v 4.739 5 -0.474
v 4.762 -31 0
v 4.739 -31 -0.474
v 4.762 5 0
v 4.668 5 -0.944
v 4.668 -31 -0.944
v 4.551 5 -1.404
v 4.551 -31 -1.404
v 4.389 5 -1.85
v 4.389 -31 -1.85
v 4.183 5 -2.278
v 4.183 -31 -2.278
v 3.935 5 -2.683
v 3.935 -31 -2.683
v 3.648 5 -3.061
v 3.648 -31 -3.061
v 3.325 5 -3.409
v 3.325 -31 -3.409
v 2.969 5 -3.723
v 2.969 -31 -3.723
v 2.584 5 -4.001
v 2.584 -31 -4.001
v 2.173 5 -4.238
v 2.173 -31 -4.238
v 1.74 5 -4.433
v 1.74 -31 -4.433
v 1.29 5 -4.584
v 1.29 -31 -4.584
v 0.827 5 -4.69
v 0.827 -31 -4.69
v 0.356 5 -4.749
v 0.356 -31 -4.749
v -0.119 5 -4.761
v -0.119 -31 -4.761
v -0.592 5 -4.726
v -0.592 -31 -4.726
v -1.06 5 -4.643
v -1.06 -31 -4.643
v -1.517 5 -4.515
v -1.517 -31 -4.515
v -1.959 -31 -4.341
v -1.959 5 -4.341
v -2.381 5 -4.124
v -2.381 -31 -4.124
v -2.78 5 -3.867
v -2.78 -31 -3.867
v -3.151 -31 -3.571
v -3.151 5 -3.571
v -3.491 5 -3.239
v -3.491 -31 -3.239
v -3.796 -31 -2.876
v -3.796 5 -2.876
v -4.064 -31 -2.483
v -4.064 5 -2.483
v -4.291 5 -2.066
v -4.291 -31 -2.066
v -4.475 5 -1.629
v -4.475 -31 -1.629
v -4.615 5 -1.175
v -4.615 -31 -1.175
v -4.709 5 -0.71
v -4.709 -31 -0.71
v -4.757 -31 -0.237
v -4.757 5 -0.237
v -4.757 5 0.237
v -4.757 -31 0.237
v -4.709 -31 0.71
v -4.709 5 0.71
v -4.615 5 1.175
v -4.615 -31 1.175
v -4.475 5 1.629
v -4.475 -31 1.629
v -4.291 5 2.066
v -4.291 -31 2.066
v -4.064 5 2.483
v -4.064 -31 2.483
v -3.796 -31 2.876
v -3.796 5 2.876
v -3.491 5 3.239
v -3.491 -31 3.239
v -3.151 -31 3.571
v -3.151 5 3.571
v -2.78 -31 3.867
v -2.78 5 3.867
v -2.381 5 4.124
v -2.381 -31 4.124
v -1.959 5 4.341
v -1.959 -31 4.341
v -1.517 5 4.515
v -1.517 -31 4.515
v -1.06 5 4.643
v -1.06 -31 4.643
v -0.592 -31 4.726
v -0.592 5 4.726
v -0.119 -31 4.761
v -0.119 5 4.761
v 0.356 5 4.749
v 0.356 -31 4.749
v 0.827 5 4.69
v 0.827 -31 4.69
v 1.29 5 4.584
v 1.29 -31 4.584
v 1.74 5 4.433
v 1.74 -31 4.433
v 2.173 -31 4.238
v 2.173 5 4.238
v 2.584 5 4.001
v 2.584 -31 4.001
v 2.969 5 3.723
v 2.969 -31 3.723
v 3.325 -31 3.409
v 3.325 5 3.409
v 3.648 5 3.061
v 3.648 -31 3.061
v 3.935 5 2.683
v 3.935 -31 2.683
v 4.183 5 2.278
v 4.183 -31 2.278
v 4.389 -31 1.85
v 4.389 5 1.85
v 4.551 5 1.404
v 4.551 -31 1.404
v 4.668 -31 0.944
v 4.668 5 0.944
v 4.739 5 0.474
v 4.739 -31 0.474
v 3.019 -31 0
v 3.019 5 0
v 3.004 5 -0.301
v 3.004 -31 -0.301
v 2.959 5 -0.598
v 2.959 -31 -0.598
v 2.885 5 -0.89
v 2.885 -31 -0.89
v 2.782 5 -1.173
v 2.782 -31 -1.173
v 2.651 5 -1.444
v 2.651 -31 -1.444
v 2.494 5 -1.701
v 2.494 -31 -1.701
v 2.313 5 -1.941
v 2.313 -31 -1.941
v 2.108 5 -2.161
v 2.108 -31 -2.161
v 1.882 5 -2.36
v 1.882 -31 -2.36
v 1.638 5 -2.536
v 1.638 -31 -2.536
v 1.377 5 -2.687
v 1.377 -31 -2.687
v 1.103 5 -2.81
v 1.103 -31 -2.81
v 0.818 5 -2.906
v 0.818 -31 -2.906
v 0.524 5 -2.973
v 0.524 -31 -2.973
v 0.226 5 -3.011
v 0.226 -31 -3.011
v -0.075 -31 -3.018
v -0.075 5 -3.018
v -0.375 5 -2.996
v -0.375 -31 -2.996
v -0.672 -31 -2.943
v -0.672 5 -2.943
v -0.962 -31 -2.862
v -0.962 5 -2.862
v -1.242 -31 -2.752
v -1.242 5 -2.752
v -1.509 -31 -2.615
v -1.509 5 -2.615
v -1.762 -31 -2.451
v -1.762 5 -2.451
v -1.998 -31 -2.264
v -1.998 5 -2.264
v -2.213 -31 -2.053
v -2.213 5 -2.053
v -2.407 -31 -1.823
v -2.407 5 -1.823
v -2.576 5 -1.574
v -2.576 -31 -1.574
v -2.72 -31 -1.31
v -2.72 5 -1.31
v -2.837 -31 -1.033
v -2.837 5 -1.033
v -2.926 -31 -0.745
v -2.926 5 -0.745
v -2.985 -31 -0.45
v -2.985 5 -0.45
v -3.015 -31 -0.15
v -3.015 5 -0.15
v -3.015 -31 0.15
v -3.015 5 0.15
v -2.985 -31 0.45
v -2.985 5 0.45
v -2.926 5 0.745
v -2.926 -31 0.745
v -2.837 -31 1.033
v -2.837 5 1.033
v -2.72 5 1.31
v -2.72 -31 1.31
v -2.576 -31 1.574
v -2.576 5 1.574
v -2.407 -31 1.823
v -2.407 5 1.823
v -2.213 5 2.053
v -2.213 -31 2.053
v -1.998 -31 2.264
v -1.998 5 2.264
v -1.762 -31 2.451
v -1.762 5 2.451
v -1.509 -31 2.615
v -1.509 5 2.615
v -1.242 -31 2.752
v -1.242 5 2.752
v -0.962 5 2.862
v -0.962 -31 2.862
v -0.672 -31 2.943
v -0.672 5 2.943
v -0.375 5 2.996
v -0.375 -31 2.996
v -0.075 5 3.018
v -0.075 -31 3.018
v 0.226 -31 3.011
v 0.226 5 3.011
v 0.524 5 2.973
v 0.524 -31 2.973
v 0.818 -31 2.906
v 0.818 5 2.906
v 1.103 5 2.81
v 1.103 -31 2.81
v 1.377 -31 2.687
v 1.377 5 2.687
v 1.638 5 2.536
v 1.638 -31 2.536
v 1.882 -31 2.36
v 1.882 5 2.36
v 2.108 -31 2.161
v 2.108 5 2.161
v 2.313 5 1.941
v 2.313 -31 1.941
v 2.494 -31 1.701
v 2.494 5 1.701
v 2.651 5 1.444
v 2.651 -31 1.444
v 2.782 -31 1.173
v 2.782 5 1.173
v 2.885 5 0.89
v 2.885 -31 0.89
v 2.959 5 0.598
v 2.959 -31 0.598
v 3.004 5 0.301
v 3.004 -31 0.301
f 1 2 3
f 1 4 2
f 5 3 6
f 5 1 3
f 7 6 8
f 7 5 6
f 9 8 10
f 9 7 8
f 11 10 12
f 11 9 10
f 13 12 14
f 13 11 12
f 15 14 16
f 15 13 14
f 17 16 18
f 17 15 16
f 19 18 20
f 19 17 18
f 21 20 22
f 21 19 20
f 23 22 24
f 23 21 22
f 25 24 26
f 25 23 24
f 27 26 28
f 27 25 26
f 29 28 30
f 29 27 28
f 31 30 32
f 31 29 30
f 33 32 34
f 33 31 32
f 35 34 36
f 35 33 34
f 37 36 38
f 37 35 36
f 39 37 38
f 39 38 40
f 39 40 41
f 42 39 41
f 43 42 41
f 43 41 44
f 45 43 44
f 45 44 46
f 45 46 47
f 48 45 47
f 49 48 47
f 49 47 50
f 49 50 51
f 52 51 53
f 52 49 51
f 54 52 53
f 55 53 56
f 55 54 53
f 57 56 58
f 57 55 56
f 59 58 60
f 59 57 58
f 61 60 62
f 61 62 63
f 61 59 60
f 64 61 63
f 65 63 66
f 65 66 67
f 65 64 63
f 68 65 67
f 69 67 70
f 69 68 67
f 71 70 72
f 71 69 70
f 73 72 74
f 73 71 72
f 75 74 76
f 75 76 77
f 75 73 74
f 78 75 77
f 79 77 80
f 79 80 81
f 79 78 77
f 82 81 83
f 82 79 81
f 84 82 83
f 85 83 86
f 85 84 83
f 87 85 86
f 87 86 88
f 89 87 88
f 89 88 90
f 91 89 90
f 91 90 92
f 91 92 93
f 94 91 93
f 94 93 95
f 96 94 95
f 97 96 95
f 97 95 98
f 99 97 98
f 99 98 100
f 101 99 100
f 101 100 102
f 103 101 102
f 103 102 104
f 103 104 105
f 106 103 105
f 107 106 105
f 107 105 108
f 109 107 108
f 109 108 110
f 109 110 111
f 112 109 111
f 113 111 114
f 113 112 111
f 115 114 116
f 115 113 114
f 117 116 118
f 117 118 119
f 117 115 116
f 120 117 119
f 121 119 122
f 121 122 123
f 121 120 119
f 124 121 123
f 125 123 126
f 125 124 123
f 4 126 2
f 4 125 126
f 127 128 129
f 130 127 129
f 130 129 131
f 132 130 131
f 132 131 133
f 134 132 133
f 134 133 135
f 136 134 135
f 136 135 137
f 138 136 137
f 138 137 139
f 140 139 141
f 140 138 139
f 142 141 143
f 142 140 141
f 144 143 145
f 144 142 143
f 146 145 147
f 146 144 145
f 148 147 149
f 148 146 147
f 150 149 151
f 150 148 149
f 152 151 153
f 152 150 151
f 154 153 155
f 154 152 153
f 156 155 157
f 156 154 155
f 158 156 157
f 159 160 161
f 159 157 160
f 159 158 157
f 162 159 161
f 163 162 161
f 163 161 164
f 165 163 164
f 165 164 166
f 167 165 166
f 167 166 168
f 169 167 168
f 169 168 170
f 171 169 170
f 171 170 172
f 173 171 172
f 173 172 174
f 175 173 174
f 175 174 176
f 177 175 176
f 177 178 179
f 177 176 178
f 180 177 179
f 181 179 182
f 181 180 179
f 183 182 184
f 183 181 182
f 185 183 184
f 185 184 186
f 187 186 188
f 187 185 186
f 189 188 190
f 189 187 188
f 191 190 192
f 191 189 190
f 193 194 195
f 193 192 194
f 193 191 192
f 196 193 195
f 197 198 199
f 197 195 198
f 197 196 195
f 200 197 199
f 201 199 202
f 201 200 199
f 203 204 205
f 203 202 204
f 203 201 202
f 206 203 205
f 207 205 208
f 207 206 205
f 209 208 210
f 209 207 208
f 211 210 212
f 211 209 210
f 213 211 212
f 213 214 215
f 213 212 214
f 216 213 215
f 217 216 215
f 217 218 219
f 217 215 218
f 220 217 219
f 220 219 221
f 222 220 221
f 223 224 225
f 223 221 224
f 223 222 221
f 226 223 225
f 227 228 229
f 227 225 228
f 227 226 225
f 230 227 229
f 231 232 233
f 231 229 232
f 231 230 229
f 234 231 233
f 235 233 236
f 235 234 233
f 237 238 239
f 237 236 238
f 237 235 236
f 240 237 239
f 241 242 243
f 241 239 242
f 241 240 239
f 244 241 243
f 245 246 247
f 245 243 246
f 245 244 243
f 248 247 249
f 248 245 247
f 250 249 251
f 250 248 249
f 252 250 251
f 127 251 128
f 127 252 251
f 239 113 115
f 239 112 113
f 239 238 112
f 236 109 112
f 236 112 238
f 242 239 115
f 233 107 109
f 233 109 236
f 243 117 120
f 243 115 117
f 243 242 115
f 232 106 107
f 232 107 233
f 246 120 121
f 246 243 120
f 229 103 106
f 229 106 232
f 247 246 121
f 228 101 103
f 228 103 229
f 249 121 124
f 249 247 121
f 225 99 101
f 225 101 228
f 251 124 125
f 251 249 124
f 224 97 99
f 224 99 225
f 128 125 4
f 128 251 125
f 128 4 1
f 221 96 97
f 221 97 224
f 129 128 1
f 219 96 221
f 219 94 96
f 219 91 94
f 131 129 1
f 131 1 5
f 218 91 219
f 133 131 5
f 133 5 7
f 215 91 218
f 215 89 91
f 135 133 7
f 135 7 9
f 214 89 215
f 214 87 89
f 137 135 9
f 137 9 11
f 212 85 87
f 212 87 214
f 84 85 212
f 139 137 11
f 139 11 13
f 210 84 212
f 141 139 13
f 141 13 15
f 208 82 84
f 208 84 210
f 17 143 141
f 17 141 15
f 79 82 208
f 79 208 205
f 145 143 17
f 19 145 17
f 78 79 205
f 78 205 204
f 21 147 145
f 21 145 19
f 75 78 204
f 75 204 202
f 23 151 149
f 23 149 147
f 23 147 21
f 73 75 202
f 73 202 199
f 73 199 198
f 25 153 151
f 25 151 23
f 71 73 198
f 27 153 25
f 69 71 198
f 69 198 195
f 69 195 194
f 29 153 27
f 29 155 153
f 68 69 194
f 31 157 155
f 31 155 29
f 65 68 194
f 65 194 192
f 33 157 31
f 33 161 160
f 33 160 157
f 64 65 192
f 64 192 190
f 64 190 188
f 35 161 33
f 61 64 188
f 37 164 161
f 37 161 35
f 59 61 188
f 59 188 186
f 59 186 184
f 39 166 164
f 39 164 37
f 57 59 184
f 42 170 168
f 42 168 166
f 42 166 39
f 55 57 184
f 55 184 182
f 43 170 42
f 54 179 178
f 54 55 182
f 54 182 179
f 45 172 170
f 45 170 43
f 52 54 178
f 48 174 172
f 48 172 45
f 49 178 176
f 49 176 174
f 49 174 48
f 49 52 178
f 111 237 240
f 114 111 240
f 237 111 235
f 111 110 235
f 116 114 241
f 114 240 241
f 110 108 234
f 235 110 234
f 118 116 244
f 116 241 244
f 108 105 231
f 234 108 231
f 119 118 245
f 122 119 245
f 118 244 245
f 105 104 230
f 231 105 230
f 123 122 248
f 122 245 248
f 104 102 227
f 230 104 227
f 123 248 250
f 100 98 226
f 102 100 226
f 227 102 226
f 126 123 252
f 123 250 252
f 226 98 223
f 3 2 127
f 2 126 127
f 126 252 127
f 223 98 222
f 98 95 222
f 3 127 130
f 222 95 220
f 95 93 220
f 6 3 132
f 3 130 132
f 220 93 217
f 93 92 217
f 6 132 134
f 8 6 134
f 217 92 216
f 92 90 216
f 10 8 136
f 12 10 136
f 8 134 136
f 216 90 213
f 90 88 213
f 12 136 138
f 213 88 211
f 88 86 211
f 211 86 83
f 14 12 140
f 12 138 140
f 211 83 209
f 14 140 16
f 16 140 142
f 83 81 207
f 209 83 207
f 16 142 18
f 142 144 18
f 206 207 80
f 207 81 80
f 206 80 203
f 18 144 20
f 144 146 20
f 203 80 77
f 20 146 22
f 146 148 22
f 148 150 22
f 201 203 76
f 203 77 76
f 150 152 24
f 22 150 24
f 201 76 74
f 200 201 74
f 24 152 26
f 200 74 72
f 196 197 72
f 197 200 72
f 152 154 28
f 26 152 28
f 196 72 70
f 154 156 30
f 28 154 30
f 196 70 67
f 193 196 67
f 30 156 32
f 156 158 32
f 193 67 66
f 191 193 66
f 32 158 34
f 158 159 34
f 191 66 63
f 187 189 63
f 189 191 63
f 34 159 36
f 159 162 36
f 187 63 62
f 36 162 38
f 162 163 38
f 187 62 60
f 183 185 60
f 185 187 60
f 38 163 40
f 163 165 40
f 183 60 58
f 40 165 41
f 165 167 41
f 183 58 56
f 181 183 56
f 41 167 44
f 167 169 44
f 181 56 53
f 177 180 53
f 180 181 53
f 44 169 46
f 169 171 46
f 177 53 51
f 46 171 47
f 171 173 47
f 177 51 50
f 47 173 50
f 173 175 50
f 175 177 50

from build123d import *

# Parameters (mm, degrees)
SKETCH1_R               = 4.7625
SKETCH1_R_2             = 3.018976491
BOSS_EXTRUDE1_DEPTH     = 65
SKETCH5_W               = 36.473052953
SKETCH5_H               = 81.397778837
CUT_EXTRUDE2_DEPTH      = 5.7625
CUT_EXTRUDE2_DEPTH_BACK = 5.7625
SKETCH6_W               = 37.230077322
SKETCH6_H               = 44.032609969
CUT_EXTRUDE3_DEPTH      = 5.7625
CUT_EXTRUDE3_DEPTH_BACK = 5.7625


with BuildPart() as part:
    # Sketch1 → Boss-Extrude1 (new body, symmetric)
    with BuildSketch(Plane(origin=(0, 0, 0), x_dir=(1, 0, 0), z_dir=(0, 1, 0))):
        Circle(SKETCH1_R)
        Circle(SKETCH1_R_2, mode=Mode.SUBTRACT)
    extrude(amount=BOSS_EXTRUDE1_DEPTH, both=True)

    # Sketch5 → Cut-Extrude2 (cut, two sides)
    with BuildSketch(Plane(origin=(0, 0, 0), x_dir=(0, 0, -1), z_dir=(1, 0, 0))) as cut_extrude2_sk:
        with Locations((-2.67750977, 45.698889419)):
            Rectangle(SKETCH5_W, SKETCH5_H)
    extrude(amount=CUT_EXTRUDE2_DEPTH, mode=Mode.SUBTRACT)
    extrude(cut_extrude2_sk.sketch, amount=-CUT_EXTRUDE2_DEPTH_BACK, mode=Mode.SUBTRACT)

    # Sketch6 → Cut-Extrude3 (cut, two sides)
    with BuildSketch(Plane(origin=(0, 0, 0), x_dir=(0, 0, -1), z_dir=(1, 0, 0))) as cut_extrude3_sk:
        with Locations((-3.171451031, -53.016304985)):
            Rectangle(SKETCH6_W, SKETCH6_H)
    extrude(amount=CUT_EXTRUDE3_DEPTH, mode=Mode.SUBTRACT)
    extrude(cut_extrude3_sk.sketch, amount=-CUT_EXTRUDE3_DEPTH_BACK, mode=Mode.SUBTRACT)


solid = part.part
